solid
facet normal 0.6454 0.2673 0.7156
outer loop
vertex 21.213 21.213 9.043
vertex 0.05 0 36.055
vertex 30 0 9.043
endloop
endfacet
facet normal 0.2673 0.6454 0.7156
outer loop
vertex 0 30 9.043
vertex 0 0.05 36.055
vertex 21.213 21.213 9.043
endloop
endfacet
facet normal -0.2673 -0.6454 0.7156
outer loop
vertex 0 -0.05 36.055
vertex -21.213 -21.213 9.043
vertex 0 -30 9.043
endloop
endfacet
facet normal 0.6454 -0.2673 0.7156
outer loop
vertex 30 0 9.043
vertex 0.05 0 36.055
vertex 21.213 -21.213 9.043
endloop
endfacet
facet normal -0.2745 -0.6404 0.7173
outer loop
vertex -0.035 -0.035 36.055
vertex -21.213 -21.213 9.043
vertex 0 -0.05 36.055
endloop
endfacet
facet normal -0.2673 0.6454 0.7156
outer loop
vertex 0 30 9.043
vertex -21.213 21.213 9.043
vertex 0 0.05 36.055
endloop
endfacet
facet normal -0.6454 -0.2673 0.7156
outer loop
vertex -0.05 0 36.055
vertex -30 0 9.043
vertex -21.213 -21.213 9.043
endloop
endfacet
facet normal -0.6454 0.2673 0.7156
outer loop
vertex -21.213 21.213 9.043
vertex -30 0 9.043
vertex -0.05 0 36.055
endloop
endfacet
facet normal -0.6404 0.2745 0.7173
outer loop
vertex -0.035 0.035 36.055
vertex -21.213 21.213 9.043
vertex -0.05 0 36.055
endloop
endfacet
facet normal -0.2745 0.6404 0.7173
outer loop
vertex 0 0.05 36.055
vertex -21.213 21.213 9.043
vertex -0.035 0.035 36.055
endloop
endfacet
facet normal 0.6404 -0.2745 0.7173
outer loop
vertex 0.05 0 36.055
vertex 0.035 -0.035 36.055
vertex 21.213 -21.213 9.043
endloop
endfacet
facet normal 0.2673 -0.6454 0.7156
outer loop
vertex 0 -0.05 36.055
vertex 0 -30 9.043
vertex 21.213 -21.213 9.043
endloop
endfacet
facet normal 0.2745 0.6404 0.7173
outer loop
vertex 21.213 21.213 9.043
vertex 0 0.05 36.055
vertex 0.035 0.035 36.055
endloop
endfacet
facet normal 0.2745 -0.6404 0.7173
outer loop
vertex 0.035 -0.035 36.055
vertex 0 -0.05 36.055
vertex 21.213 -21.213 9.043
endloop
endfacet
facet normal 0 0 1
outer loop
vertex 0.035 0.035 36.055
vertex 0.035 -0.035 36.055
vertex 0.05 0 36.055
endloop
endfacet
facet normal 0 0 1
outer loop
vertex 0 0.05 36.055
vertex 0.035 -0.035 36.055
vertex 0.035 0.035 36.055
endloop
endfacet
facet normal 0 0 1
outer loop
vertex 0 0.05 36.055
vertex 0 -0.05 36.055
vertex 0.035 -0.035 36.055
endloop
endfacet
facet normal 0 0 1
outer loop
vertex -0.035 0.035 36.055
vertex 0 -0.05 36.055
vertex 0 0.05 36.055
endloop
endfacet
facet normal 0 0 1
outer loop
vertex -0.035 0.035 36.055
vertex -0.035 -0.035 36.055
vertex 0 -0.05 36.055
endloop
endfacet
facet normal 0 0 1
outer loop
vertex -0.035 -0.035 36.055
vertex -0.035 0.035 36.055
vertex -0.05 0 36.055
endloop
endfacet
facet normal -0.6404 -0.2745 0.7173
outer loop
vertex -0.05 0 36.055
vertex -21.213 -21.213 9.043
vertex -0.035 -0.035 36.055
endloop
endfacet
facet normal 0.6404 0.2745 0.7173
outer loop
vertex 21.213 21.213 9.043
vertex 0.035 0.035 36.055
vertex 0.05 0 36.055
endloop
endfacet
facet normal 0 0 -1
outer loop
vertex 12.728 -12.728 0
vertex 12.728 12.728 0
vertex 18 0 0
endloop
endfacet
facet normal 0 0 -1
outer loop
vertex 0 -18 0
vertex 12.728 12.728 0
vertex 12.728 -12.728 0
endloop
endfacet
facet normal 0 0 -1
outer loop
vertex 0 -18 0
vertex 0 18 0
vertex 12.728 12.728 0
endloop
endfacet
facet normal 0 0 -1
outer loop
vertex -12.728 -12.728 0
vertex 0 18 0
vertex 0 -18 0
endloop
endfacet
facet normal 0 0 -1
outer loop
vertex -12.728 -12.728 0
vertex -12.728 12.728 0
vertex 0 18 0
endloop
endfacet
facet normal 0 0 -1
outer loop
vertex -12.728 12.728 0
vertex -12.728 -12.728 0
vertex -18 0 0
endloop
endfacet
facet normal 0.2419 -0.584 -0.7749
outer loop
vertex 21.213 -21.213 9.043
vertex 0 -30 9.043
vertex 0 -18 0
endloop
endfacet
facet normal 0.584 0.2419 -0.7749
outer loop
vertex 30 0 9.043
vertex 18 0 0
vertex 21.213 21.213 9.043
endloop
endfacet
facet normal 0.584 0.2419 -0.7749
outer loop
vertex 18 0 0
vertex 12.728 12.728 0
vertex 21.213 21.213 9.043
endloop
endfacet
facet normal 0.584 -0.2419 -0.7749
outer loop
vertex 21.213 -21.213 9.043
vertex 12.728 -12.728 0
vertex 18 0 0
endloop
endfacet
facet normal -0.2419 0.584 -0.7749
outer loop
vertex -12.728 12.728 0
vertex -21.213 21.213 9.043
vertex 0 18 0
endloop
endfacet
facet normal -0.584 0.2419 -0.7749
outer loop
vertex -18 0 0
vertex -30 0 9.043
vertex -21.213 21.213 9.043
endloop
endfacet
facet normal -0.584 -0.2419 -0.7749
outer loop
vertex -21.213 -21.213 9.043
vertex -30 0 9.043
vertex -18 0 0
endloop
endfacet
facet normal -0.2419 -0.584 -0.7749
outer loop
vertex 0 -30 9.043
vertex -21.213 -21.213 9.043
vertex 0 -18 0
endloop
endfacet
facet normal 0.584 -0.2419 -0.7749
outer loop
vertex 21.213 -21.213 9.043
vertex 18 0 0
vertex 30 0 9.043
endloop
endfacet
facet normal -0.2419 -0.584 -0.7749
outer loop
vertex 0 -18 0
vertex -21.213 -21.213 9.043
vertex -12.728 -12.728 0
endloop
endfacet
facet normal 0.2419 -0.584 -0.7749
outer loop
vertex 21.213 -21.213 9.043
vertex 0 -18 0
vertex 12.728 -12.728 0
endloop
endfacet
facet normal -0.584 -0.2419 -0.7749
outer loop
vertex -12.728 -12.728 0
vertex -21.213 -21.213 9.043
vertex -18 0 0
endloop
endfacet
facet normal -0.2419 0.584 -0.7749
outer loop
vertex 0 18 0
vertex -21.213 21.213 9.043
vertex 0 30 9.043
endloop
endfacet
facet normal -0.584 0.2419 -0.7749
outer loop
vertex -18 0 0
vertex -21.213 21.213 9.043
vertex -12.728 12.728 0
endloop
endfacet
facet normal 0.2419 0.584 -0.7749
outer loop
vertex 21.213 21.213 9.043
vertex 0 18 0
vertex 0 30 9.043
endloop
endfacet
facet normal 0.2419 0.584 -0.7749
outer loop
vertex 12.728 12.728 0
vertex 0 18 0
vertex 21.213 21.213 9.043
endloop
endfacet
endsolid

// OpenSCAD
dia=60;
a_lower=42; //  [40:0.5:42]
a_upper=37; // [31:0.5:37]
plate=0.6;  // [0.56:0.02:0.66]0.56-0.66
offset=0;   // [0:0.2:2]

simple();

module simple()
{
    translate([0,0,dia/2*(1-plate)*tan(a_upper)+offset]) cylinder(d1=dia, d2=0.1, h=dia/2*tan(a_lower), $fn=8);
    translate([0,0,dia/2*(1-plate)*tan(a_upper)])cylinder(d1=dia, d2=dia, h=offset, $fn=8);
    cylinder(r1=dia/2*plate, r2=dia/2, h=dia/2*(1-plate)*tan(a_upper), $fn=8);
}
